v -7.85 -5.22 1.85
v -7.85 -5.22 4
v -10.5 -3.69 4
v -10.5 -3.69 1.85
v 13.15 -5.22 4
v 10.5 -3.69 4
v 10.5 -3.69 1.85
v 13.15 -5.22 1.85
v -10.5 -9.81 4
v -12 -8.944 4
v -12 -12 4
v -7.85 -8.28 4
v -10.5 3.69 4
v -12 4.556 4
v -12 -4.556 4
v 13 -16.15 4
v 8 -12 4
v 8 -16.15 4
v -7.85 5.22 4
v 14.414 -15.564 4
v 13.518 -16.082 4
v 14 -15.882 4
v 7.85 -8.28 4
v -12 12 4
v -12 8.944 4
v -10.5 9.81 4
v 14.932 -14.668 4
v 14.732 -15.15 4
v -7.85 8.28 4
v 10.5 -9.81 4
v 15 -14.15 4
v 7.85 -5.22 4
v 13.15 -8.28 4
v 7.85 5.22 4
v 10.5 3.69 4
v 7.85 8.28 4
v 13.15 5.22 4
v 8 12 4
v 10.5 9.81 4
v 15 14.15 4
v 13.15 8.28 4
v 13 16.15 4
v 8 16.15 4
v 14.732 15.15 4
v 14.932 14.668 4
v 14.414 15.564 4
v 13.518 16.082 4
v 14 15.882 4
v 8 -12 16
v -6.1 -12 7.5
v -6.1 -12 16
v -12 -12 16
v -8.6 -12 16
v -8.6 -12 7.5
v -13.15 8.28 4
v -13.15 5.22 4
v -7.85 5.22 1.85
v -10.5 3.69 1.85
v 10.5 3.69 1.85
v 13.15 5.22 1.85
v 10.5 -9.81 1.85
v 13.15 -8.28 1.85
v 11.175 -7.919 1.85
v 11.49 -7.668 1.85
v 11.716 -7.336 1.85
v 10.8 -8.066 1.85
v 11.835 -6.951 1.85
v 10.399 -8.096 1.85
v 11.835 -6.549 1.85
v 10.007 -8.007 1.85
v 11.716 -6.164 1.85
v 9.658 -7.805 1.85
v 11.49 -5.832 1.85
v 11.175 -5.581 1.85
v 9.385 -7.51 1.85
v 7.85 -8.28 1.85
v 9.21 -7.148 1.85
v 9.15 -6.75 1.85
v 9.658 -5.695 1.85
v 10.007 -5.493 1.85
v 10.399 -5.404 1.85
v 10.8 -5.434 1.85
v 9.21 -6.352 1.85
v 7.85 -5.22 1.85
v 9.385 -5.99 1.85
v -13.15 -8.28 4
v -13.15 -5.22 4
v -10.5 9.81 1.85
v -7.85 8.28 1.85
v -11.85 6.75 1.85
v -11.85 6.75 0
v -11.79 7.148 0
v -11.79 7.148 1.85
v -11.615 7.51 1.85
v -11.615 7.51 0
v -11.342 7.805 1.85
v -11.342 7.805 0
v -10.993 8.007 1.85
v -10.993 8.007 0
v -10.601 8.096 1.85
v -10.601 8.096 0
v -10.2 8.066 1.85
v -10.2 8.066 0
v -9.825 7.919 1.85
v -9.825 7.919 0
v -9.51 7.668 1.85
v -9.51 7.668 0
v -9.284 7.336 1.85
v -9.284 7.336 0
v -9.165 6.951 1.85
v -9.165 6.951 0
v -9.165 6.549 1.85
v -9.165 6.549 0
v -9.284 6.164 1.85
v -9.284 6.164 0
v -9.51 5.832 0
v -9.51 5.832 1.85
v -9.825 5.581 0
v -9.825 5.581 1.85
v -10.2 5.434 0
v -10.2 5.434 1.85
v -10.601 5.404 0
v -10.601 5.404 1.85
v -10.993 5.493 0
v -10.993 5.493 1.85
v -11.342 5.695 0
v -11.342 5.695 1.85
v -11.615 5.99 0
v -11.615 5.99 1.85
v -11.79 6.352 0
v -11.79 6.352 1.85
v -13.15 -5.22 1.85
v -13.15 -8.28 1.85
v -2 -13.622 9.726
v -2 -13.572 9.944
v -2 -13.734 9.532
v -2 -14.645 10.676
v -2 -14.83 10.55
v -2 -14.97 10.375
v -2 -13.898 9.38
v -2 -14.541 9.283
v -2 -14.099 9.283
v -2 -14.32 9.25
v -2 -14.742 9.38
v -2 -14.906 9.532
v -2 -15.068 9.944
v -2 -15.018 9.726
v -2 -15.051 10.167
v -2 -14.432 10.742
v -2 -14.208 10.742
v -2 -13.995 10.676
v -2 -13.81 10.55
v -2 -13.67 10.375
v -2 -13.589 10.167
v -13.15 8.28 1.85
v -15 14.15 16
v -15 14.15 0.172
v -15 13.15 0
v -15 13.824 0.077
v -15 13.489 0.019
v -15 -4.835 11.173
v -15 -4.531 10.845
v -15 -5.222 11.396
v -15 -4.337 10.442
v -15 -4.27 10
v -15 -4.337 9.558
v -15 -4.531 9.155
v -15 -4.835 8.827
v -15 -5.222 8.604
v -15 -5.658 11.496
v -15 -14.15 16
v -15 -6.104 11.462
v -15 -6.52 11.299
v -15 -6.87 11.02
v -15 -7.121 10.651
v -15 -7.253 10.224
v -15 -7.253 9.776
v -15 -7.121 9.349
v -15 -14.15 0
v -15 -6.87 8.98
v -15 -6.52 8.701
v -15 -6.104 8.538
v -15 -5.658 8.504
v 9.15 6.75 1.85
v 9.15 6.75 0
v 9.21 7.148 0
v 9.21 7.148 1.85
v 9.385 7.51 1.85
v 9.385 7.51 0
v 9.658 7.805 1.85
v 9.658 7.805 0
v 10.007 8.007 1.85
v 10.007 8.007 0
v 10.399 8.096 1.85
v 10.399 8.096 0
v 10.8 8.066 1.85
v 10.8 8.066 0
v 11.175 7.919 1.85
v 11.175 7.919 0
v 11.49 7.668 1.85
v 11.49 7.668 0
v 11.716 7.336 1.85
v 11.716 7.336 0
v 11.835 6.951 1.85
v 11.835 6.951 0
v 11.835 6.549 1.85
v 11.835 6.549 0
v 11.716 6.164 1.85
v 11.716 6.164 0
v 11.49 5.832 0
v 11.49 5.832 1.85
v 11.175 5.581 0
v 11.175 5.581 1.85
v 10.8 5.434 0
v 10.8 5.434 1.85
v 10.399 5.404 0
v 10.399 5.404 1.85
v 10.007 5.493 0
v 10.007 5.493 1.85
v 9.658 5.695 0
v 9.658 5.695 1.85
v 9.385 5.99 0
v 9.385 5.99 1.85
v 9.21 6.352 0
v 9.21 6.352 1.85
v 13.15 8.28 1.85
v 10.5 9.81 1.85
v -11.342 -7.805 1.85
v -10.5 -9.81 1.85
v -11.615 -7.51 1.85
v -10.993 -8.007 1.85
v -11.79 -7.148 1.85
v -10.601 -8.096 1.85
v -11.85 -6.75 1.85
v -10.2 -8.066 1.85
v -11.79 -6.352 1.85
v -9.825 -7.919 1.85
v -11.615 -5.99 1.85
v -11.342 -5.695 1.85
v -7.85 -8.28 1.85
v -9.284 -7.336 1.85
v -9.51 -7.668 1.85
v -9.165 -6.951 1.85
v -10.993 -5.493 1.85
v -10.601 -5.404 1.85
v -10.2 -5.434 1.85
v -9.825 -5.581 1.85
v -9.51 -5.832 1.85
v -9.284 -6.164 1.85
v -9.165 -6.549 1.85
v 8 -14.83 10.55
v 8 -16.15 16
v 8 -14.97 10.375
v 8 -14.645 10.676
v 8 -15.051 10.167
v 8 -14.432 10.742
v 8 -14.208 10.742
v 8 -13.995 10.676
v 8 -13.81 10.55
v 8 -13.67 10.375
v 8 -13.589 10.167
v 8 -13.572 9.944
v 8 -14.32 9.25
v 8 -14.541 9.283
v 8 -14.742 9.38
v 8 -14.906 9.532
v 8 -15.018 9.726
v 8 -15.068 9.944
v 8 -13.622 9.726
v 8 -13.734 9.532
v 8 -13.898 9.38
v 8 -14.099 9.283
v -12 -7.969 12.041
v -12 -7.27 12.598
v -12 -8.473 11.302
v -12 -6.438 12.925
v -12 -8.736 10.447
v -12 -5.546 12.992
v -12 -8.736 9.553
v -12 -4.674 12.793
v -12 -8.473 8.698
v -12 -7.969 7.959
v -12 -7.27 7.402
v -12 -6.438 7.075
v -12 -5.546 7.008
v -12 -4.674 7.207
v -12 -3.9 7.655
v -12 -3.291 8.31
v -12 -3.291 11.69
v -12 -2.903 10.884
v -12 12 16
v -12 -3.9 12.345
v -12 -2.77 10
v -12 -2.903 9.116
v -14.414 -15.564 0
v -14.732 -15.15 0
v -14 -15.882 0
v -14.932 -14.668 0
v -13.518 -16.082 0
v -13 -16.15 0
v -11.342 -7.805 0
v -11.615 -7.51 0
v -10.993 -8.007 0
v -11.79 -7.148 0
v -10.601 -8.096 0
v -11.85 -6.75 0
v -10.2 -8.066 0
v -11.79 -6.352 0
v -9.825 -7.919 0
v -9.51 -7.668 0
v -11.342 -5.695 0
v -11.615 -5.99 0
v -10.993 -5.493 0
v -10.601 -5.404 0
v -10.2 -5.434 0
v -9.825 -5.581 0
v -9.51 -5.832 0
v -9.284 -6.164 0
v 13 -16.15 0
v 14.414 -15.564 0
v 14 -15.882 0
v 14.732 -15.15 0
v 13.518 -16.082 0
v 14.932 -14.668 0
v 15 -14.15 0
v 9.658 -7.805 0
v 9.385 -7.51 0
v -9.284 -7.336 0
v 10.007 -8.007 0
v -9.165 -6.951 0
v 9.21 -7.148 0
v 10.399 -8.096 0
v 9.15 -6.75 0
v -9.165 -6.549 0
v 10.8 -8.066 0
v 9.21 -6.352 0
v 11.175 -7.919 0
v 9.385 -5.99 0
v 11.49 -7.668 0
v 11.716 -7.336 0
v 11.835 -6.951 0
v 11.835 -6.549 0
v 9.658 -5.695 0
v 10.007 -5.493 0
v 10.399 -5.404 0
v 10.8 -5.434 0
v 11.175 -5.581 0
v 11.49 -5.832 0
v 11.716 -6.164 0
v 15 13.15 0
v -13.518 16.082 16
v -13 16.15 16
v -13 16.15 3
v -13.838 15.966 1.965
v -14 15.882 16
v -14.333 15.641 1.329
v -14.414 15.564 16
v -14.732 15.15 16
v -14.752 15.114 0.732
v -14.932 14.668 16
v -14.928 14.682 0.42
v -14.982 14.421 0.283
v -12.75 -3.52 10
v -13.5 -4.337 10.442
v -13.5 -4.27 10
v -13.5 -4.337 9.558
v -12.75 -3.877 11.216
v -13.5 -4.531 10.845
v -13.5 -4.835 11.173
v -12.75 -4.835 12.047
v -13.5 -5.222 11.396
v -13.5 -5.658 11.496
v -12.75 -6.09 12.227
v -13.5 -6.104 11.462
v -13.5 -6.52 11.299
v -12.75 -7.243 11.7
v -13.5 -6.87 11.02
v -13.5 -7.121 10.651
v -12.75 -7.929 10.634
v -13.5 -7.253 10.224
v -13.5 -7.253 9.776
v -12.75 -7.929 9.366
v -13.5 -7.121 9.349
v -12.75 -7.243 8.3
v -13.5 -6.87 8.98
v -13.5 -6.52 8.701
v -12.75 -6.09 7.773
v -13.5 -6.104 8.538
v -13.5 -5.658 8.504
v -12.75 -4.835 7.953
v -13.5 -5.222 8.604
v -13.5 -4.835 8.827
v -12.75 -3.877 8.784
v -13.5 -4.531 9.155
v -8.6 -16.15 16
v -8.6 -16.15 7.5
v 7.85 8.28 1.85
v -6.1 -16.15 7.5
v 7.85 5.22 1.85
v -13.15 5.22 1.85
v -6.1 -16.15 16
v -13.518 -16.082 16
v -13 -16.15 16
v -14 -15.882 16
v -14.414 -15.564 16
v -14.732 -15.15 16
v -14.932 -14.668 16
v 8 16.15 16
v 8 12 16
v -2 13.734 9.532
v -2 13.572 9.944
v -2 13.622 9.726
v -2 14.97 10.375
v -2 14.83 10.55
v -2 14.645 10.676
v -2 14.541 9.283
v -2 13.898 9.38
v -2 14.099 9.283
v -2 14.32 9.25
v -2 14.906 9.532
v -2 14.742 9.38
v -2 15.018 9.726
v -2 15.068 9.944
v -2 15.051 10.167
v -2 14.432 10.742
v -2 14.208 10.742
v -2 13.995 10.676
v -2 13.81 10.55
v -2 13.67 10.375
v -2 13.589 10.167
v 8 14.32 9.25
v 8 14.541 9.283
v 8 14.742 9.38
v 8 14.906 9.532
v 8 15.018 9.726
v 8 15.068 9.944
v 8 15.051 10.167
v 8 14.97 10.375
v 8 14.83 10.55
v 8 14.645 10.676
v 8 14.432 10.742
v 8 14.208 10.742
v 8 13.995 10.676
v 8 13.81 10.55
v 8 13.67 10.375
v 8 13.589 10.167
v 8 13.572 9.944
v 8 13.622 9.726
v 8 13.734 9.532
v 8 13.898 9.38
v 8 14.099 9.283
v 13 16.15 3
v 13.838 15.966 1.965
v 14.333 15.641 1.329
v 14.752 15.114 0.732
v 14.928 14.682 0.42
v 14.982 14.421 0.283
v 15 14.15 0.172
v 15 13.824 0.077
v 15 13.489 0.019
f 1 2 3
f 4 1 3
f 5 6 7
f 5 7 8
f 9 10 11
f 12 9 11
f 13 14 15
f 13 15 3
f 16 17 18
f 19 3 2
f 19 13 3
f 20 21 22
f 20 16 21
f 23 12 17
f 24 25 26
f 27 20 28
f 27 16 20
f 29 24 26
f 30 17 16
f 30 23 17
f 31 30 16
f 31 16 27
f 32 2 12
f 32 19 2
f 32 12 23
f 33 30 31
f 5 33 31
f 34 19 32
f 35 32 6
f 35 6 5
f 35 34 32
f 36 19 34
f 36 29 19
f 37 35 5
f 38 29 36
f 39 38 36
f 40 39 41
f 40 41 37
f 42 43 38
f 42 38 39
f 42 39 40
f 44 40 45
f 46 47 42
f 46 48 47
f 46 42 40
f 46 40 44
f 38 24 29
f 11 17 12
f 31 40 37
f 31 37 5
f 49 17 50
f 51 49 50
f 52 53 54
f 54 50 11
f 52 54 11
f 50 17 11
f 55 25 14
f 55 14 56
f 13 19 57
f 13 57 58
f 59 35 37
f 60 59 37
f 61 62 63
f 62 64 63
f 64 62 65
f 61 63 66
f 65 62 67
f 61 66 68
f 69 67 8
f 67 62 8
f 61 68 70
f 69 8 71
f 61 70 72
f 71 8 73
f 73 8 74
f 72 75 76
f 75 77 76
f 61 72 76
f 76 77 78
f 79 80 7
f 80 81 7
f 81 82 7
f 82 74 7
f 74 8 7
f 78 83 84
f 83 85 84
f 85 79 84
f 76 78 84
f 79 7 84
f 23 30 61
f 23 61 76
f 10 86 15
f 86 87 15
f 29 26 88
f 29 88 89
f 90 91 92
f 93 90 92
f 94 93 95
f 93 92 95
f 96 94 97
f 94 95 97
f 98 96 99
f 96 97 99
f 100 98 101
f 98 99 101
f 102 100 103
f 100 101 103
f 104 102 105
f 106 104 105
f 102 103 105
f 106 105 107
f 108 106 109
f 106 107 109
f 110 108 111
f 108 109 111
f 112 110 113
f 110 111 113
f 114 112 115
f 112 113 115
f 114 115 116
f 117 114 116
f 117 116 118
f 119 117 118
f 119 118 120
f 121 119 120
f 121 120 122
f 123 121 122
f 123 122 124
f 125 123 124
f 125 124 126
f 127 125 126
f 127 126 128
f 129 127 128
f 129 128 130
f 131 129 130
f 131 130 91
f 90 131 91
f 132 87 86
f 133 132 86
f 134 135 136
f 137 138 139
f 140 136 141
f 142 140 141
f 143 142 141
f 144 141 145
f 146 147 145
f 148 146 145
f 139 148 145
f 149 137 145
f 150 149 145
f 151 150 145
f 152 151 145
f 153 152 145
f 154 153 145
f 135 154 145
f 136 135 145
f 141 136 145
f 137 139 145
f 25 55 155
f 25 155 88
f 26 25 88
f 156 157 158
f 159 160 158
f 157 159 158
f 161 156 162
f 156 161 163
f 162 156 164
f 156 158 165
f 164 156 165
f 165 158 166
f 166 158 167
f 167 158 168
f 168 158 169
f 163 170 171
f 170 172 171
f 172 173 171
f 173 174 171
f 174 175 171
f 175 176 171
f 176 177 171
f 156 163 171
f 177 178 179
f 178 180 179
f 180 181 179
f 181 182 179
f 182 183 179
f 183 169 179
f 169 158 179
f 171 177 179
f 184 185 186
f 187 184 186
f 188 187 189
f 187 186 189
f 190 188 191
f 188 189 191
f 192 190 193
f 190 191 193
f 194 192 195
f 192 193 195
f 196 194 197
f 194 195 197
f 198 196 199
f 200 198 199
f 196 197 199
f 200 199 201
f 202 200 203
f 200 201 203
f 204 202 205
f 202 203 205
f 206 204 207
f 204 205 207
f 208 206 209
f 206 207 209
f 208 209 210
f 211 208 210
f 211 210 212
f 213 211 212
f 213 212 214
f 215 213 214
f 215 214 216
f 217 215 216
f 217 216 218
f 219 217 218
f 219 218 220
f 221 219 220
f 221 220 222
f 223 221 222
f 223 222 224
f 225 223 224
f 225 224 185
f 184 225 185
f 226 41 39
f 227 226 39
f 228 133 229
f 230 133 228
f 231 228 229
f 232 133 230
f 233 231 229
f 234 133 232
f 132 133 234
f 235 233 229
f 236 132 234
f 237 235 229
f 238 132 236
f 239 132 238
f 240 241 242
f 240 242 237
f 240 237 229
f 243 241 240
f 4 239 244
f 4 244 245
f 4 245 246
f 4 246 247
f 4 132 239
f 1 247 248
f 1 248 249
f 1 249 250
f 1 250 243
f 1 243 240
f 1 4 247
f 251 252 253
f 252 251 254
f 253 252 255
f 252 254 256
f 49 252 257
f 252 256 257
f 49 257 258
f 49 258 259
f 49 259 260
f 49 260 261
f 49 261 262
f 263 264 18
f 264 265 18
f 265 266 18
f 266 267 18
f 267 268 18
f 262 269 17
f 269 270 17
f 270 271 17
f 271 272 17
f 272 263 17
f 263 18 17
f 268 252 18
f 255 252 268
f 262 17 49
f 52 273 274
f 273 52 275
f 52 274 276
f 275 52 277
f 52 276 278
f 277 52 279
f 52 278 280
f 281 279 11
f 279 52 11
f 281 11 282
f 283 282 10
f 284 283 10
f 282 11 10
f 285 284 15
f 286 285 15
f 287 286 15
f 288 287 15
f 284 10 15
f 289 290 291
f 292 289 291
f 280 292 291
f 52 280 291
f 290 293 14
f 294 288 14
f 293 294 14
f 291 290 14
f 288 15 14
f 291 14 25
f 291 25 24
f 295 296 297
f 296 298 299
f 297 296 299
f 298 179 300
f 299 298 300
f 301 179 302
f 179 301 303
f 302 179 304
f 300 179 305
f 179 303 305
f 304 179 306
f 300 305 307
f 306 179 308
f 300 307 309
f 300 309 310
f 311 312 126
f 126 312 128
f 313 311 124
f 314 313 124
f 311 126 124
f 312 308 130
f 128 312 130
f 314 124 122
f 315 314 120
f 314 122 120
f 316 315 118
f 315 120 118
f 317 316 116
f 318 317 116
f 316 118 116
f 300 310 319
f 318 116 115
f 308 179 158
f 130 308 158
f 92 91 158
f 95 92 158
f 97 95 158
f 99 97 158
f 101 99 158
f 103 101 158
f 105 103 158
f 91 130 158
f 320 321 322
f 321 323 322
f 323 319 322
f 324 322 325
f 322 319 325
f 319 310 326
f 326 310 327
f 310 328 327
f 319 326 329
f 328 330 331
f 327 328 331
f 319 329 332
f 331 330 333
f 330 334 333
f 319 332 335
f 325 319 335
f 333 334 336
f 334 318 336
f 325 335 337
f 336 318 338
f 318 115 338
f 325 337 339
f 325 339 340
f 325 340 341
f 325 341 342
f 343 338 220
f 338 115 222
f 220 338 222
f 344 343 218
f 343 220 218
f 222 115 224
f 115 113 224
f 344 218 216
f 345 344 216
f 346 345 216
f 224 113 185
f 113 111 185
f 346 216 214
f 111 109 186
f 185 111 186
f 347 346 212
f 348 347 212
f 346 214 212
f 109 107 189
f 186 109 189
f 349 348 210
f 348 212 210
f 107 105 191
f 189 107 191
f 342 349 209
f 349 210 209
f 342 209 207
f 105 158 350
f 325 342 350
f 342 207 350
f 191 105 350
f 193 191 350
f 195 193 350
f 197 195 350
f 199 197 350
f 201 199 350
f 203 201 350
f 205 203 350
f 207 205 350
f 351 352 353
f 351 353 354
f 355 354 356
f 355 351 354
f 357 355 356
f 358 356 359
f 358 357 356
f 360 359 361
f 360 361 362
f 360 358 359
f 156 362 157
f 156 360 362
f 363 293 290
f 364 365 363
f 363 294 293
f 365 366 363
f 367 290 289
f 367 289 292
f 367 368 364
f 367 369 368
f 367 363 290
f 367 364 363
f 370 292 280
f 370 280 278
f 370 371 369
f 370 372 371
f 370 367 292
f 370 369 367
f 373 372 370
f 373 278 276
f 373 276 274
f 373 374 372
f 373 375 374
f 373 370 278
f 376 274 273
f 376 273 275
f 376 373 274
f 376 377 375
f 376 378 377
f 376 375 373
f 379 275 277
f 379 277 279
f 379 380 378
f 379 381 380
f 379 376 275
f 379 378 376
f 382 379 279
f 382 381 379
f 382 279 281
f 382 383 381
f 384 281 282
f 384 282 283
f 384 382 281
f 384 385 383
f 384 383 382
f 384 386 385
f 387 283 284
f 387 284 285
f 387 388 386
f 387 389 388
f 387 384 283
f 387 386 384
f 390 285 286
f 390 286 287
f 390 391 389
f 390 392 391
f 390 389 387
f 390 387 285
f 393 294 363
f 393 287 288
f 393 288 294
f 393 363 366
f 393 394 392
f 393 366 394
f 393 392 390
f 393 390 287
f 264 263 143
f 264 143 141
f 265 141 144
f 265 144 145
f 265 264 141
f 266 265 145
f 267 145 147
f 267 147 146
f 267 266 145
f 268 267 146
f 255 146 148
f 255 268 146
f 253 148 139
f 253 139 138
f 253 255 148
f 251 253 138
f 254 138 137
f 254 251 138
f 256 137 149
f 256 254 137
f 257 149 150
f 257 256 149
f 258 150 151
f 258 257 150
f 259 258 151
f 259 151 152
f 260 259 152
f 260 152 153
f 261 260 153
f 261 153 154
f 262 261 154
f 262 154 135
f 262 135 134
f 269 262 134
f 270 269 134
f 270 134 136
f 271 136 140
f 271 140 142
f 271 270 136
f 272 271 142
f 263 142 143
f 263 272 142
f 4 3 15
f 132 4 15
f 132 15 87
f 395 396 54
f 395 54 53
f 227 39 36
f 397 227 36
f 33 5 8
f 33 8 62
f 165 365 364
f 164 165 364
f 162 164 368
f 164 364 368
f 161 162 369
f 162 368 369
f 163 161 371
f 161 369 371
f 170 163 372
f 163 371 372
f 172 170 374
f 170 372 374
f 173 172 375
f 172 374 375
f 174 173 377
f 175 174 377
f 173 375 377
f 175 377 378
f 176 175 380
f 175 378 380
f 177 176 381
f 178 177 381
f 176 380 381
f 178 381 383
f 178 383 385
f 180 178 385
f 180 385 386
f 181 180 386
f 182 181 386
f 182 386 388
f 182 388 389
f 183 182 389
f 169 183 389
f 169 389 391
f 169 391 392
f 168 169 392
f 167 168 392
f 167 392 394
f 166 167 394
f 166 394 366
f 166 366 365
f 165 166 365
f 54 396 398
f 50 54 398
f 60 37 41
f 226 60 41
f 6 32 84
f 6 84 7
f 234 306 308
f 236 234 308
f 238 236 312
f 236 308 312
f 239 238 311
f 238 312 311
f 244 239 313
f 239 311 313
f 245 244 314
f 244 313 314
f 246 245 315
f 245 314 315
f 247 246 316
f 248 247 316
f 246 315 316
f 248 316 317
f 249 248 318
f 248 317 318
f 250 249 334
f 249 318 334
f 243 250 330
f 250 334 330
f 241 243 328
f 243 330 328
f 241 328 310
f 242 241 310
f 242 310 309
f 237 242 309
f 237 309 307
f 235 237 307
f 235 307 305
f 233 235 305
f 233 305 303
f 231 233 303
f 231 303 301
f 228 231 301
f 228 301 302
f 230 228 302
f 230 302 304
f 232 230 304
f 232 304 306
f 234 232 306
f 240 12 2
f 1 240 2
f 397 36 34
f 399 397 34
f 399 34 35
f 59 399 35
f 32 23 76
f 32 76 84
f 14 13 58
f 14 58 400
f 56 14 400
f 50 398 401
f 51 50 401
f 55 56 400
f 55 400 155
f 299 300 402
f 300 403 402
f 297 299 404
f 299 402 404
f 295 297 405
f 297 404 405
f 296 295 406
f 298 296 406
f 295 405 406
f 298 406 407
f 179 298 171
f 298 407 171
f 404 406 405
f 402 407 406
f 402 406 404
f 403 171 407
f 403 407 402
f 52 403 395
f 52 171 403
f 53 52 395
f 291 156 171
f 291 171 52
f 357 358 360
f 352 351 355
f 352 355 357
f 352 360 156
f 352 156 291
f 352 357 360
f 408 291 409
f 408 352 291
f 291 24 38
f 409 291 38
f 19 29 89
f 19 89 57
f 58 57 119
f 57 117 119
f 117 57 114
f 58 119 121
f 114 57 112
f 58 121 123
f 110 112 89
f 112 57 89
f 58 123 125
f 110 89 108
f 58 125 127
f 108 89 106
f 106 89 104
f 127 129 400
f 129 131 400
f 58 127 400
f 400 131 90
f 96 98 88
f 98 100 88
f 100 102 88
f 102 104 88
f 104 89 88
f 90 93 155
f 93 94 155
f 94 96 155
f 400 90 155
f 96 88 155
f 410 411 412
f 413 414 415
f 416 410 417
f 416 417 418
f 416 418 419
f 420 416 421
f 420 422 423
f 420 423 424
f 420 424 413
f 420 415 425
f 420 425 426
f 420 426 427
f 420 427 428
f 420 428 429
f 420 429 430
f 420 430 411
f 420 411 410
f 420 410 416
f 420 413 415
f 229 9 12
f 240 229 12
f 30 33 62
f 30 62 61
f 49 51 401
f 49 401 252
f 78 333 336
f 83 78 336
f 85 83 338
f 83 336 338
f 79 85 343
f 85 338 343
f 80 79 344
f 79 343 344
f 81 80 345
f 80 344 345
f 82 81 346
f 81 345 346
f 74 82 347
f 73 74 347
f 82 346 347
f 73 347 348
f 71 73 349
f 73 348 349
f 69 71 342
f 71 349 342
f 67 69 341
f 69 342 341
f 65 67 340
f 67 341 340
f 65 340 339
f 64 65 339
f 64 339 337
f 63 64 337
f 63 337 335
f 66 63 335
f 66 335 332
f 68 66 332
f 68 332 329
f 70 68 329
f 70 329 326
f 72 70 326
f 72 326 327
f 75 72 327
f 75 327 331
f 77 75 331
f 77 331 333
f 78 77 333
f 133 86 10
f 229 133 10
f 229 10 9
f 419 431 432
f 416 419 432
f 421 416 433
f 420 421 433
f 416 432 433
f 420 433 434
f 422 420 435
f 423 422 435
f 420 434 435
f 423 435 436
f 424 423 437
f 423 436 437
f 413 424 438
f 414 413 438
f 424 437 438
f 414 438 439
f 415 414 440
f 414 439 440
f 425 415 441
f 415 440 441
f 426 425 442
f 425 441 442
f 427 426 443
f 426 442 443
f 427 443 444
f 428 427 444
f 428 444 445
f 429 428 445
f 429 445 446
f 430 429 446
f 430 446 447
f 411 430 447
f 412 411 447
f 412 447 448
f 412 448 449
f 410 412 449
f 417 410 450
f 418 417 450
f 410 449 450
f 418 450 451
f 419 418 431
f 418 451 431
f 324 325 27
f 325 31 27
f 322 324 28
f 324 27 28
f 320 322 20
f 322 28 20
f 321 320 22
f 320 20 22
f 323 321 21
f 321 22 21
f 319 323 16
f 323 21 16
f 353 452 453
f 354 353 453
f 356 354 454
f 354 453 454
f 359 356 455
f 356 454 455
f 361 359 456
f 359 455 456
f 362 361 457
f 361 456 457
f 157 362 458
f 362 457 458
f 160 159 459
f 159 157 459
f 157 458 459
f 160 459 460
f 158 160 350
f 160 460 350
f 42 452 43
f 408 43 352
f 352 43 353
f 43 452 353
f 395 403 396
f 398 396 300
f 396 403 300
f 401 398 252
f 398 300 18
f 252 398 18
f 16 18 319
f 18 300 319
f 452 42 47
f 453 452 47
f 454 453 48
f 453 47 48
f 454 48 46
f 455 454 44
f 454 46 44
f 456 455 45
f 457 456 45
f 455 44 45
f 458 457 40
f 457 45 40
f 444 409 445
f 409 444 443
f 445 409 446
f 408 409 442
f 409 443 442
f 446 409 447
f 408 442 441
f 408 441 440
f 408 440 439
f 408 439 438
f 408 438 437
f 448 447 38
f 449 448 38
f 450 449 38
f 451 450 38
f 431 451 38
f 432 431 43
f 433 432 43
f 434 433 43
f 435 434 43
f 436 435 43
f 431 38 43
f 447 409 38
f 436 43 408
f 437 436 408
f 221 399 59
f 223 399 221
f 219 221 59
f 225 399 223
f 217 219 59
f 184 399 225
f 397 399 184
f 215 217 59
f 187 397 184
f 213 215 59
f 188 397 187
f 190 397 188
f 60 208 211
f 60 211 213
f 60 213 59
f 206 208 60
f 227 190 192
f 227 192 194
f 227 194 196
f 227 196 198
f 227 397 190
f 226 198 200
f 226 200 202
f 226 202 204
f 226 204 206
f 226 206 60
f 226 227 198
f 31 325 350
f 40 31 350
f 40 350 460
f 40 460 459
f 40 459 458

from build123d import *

# Parameters (mm, degrees)
SKETCH_1_W             = 30
SKETCH_1_H             = 32.3
EXTRUDE_417_DEPTH      = 4
EXTRUDE_710_DEPTH      = 12
SKETCH_4_R             = 1.5
CUT_EXTRUDE_1014_DEPTH = 36.296210845
CHAMFER_1_SIZE         = 1.5
SKETCH_3_R             = 0.75
CUT_EXTRUDE_1313_DEPTH = 10
SKETCH_5_W             = 2.5
SKETCH_5_H             = 8.5
CUT_EXTRUDE_1575_DEPTH = 4.15
FILLET_1_R             = 2
CUT_EXTRUDE_2459_REACH = 29.236
SKETCH_7_R             = 1.35
CUT_EXTRUDE_3094_DEPTH = 2.15
FILLET_2_R             = 3


with BuildPart() as part:
    # Эскиз1 → Extrude 417 (new body)
    with BuildSketch(Plane.XY):
        Rectangle(SKETCH_1_W, SKETCH_1_H)
    extrude(amount=EXTRUDE_417_DEPTH)

    # Эскиз2 → Extrude 710 (add)
    with BuildSketch(Plane.XY.offset(4)):
        Polygon((8, 16.15), (-15, 16.15), (-15, -16.15), (8, -16.15), (8, -12), (-12, -12), (-12, 12), (8, 12), align=None)
    extrude(amount=EXTRUDE_710_DEPTH)

    # Эскиз4 → Cut-Extrude 1014 (cut, through all)
    with BuildSketch(Plane(origin=(-12, 0, 0), x_dir=(0, 0, -1), z_dir=(1, 0, 0))):
        with Locations(Location((-10, -5.77, 0), (0, 0, 90))):
            Circle(SKETCH_4_R)
    extrude(amount=-CUT_EXTRUDE_1014_DEPTH, mode=Mode.SUBTRACT)

    # Фаска1
    chamfer_1_edges = [part.edges().sort_by_distance(p)[0] for p in [
        (-12, -7.27, 10),
    ]]
    chamfer(chamfer_1_edges, length=CHAMFER_1_SIZE)

    # Эскиз3 → Cut-Extrude 1313 (cut)
    with BuildSketch(Plane(origin=(8, 0, 0), x_dir=(0, 0, -1), z_dir=(1, 0, 0))):
        with Locations((-10, 14.32)):
            Circle(SKETCH_3_R)
    cut_extrude_1313 = extrude(amount=-CUT_EXTRUDE_1313_DEPTH, mode=Mode.SUBTRACT)

    # Зеркальное отражение2: Cut-Extrude 1313 across plane
    add(cut_extrude_1313.mirror(Plane.ZX), mode=Mode.SUBTRACT)

    # Эскиз5 → Cut-Extrude 1575 (cut)
    with BuildSketch(Plane.XZ.offset(16.15)):
        with Locations((-7.35, 11.75)):
            Rectangle(SKETCH_5_W, SKETCH_5_H)
    extrude(amount=-CUT_EXTRUDE_1575_DEPTH, mode=Mode.SUBTRACT)

    # Скругление1
    fillet_1_edges = [part.edges().sort_by_distance(p)[0] for p in [
        (15, -16.15, 2),
        (-15, -16.15, 8),
        (-15, 16.15, 8),
        (15, 16.15, 2),
    ]]
    fillet(fillet_1_edges, radius=FILLET_1_R)

    # Эскиз7 → Cut-Extrude 2459 (cut, up to next)
    with BuildSketch(Plane(origin=(0, 0, 0), x_dir=(-1, 0, 0), z_dir=(0, 0, -1)), mode=Mode.PRIVATE) as cut_extrude_2459_sk1:
        with Locations((10.5, 6.75)):
            Circle(SKETCH_7_R)
    cut_extrude_2459_tool1 = extrude(cut_extrude_2459_sk1.sketch, amount=-CUT_EXTRUDE_2459_REACH, mode=Mode.PRIVATE) & part.part
    # Эскиз7 → Cut-Extrude 2459 (cut, up to next)
    with BuildSketch(Plane(origin=(0, 0, 0), x_dir=(-1, 0, 0), z_dir=(0, 0, -1)), mode=Mode.PRIVATE) as cut_extrude_2459_sk2:
        with Locations((-10.5, 6.75)):
            Circle(SKETCH_7_R)
    cut_extrude_2459_tool2 = extrude(cut_extrude_2459_sk2.sketch, amount=-CUT_EXTRUDE_2459_REACH, mode=Mode.PRIVATE) & part.part
    # Эскиз7 → Cut-Extrude 2459 (cut, up to next)
    with BuildSketch(Plane(origin=(0, 0, 0), x_dir=(-1, 0, 0), z_dir=(0, 0, -1)), mode=Mode.PRIVATE) as cut_extrude_2459_sk3:
        with Locations((-10.5, -6.75)):
            Circle(SKETCH_7_R)
    cut_extrude_2459_tool3 = extrude(cut_extrude_2459_sk3.sketch, amount=-CUT_EXTRUDE_2459_REACH, mode=Mode.PRIVATE) & part.part
    # Эскиз7 → Cut-Extrude 2459 (cut, up to next)
    with BuildSketch(Plane(origin=(0, 0, 0), x_dir=(-1, 0, 0), z_dir=(0, 0, -1)), mode=Mode.PRIVATE) as cut_extrude_2459_sk4:
        with Locations((10.5, -6.75)):
            Circle(SKETCH_7_R)
    cut_extrude_2459_tool4 = extrude(cut_extrude_2459_sk4.sketch, amount=-CUT_EXTRUDE_2459_REACH, mode=Mode.PRIVATE) & part.part
    add(cut_extrude_2459_tool1.solids().sort_by_distance((-10.5, 6.75, 0))[0], mode=Mode.SUBTRACT)
    add(cut_extrude_2459_tool2.solids().sort_by_distance((10.5, 6.75, 0))[0], mode=Mode.SUBTRACT)
    add(cut_extrude_2459_tool3.solids().sort_by_distance((10.5, -6.75, 0))[0], mode=Mode.SUBTRACT)
    add(cut_extrude_2459_tool4.solids().sort_by_distance((-10.5, -6.75, 0))[0], mode=Mode.SUBTRACT)

    # Эскиз8 → Cut-Extrude 3094 (cut)
    with BuildSketch(Plane.XY.offset(4)):
        Polygon((10.5, 9.809956427), (7.85, 8.279978213), (7.85, 5.220021787), (10.5, 3.690043573), (13.15, 5.220021787), (13.15, 8.279978213), align=None)
        Polygon((-13.15, 8.279978213), (-10.5, 9.809956427), (-7.85, 8.279978213), (-7.85, 5.220021787), (-10.5, 3.690043573), (-13.15, 5.220021787), align=None)
        Polygon((-10.5, -9.809956427), (-7.85, -8.279978213), (-7.85, -5.220021787), (-10.5, -3.690043573), (-13.15, -5.220021787), (-13.15, -8.279978213), align=None)
        Polygon((13.15, -8.279978213), (10.5, -9.809956427), (7.85, -8.279978213), (7.85, -5.220021787), (10.5, -3.690043573), (13.15, -5.220021787), align=None)
    extrude(amount=-CUT_EXTRUDE_3094_DEPTH, mode=Mode.SUBTRACT)

    # Скругление2
    # the kernel refuses this fillet: 3 mm, written as the material it takes off along each edge
    with BuildSketch(Plane(origin=(20.5, 16.15, 0), x_dir=(0, -1, 0), z_dir=(-1, 0, 0))) as fillet_2_piece_1:
        with BuildLine():
            CenterArc((FILLET_2_R, FILLET_2_R), FILLET_2_R, 180, 90)
            Line((0, FILLET_2_R), (0, 0))
            Line((0, 0), (FILLET_2_R, 0))
        make_face()
    extrude(amount=41, mode=Mode.SUBTRACT)


solid = part.part
